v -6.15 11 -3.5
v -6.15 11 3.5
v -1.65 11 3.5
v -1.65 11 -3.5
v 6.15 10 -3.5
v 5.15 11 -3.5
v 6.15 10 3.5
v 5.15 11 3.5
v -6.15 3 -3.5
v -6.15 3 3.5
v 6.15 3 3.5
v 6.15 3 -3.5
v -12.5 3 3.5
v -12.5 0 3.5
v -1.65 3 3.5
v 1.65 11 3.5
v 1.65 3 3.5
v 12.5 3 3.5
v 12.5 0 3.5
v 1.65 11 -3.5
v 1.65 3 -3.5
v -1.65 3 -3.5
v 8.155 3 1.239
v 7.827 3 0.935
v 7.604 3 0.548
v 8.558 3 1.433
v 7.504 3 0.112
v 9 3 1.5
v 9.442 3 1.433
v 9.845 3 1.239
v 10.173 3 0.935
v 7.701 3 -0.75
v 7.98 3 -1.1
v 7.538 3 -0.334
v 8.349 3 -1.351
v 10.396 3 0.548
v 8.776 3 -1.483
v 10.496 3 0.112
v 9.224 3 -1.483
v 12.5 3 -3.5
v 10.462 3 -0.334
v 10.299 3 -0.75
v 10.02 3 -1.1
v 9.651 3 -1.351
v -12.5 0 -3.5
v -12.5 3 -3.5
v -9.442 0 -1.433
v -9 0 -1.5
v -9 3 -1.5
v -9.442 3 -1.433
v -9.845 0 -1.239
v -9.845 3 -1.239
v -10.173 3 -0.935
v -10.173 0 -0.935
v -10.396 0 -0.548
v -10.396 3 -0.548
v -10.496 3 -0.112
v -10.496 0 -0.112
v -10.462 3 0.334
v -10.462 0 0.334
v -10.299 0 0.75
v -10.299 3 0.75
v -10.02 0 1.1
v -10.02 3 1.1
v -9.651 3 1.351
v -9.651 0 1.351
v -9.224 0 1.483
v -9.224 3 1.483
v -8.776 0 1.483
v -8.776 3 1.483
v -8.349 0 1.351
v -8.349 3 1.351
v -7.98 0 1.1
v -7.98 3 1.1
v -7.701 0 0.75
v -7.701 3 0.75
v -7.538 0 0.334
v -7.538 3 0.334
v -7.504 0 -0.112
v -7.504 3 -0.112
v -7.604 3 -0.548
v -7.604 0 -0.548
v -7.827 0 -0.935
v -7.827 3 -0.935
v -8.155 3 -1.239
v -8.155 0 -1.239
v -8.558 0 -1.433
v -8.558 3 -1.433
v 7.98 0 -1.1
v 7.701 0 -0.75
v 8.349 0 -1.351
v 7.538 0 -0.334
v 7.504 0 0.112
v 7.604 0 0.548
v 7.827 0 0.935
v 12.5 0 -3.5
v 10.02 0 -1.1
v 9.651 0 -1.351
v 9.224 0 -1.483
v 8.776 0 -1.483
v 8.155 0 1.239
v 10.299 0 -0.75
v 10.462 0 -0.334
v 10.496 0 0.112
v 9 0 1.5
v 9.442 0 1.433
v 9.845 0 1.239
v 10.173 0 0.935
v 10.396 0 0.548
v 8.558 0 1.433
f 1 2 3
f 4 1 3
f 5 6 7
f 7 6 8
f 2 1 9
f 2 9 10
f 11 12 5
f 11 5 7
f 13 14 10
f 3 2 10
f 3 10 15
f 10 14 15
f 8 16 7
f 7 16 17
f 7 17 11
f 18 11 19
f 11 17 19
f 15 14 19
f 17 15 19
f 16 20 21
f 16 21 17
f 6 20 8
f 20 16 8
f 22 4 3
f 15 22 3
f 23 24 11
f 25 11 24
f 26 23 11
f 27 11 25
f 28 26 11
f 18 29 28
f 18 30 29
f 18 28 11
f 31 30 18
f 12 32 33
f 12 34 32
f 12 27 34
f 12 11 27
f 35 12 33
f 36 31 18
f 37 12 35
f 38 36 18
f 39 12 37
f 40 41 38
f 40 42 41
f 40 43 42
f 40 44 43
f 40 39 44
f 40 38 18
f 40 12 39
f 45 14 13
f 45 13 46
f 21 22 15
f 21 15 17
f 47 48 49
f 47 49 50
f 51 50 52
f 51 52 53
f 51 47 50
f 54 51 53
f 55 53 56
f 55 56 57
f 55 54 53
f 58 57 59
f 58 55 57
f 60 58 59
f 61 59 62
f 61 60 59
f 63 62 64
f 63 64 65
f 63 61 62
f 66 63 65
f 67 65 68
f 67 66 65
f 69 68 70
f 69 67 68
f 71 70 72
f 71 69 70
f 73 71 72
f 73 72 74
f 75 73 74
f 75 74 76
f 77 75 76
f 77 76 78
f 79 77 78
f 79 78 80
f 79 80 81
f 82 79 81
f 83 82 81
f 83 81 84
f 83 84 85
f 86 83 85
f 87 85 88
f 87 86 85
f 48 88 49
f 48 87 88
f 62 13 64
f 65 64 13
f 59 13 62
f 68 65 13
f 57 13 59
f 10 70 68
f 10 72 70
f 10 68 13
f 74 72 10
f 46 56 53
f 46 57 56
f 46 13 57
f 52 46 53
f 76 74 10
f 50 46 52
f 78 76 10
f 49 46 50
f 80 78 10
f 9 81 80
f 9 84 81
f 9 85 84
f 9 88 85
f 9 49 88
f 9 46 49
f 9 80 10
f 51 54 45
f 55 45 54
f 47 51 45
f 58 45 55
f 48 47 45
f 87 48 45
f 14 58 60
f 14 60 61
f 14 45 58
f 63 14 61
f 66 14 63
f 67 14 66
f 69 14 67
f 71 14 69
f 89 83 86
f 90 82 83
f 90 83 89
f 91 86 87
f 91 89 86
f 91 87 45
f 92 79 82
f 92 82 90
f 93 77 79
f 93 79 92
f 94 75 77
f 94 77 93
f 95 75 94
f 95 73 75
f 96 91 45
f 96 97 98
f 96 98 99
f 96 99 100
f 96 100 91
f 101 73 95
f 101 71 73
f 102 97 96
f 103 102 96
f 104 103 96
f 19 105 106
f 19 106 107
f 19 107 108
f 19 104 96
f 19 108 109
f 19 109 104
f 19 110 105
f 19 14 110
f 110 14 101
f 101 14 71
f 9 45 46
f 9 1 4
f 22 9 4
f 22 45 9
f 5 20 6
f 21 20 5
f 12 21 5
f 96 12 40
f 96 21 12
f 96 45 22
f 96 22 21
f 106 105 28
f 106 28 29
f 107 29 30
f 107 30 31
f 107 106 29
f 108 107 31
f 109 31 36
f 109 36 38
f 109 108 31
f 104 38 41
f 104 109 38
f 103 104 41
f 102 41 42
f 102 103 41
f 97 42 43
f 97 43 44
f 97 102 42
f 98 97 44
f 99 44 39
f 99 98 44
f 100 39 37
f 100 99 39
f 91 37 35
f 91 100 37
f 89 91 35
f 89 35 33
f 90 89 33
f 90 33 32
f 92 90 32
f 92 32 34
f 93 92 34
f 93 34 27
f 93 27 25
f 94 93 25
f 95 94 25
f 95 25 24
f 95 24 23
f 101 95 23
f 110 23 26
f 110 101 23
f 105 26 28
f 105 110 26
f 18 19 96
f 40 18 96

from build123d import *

# Parameters (mm, degrees)
SKETCH1_W           = 25
SKETCH1_H           = 7
SKETCH1_R           = 1.5
BOSS_EXTRUDE1_DEPTH = 3
SKETCH2_W           = 4.5
SKETCH2_H           = 7
BOSS_EXTRUDE2_DEPTH = 11
CHAMFER1_SIZE       = 1


with BuildPart() as part:
    # Sketch1 → Boss-Extrude1 (new body)
    with BuildSketch(Plane(origin=(0, 0, 0), x_dir=(1, 0, 0), z_dir=(0, 1, 0))):
        Rectangle(SKETCH1_W, SKETCH1_H)
        with Locations(Location((9, 0, 0), (0, 0, 270))):
            Circle(SKETCH1_R, mode=Mode.SUBTRACT)
        with Locations(Location((-9, 0, 0), (0, 0, 90))):
            Circle(SKETCH1_R, mode=Mode.SUBTRACT)
    extrude(amount=BOSS_EXTRUDE1_DEPTH)

    # Sketch2 → Boss-Extrude2 (add)
    with BuildSketch(Plane.XZ):
        with Locations((-3.9, 0)):
            Rectangle(SKETCH2_W, SKETCH2_H)
        with Locations((3.9, 0)):
            Rectangle(SKETCH2_W, SKETCH2_H)
    extrude(amount=-BOSS_EXTRUDE2_DEPTH)

    # Chamfer1
    chamfer1_edges = [part.edges().sort_by_distance(p)[0] for p in [
        (6.15, 11, 0),
    ]]
    chamfer(chamfer1_edges, length=CHAMFER1_SIZE)


solid = part.part
